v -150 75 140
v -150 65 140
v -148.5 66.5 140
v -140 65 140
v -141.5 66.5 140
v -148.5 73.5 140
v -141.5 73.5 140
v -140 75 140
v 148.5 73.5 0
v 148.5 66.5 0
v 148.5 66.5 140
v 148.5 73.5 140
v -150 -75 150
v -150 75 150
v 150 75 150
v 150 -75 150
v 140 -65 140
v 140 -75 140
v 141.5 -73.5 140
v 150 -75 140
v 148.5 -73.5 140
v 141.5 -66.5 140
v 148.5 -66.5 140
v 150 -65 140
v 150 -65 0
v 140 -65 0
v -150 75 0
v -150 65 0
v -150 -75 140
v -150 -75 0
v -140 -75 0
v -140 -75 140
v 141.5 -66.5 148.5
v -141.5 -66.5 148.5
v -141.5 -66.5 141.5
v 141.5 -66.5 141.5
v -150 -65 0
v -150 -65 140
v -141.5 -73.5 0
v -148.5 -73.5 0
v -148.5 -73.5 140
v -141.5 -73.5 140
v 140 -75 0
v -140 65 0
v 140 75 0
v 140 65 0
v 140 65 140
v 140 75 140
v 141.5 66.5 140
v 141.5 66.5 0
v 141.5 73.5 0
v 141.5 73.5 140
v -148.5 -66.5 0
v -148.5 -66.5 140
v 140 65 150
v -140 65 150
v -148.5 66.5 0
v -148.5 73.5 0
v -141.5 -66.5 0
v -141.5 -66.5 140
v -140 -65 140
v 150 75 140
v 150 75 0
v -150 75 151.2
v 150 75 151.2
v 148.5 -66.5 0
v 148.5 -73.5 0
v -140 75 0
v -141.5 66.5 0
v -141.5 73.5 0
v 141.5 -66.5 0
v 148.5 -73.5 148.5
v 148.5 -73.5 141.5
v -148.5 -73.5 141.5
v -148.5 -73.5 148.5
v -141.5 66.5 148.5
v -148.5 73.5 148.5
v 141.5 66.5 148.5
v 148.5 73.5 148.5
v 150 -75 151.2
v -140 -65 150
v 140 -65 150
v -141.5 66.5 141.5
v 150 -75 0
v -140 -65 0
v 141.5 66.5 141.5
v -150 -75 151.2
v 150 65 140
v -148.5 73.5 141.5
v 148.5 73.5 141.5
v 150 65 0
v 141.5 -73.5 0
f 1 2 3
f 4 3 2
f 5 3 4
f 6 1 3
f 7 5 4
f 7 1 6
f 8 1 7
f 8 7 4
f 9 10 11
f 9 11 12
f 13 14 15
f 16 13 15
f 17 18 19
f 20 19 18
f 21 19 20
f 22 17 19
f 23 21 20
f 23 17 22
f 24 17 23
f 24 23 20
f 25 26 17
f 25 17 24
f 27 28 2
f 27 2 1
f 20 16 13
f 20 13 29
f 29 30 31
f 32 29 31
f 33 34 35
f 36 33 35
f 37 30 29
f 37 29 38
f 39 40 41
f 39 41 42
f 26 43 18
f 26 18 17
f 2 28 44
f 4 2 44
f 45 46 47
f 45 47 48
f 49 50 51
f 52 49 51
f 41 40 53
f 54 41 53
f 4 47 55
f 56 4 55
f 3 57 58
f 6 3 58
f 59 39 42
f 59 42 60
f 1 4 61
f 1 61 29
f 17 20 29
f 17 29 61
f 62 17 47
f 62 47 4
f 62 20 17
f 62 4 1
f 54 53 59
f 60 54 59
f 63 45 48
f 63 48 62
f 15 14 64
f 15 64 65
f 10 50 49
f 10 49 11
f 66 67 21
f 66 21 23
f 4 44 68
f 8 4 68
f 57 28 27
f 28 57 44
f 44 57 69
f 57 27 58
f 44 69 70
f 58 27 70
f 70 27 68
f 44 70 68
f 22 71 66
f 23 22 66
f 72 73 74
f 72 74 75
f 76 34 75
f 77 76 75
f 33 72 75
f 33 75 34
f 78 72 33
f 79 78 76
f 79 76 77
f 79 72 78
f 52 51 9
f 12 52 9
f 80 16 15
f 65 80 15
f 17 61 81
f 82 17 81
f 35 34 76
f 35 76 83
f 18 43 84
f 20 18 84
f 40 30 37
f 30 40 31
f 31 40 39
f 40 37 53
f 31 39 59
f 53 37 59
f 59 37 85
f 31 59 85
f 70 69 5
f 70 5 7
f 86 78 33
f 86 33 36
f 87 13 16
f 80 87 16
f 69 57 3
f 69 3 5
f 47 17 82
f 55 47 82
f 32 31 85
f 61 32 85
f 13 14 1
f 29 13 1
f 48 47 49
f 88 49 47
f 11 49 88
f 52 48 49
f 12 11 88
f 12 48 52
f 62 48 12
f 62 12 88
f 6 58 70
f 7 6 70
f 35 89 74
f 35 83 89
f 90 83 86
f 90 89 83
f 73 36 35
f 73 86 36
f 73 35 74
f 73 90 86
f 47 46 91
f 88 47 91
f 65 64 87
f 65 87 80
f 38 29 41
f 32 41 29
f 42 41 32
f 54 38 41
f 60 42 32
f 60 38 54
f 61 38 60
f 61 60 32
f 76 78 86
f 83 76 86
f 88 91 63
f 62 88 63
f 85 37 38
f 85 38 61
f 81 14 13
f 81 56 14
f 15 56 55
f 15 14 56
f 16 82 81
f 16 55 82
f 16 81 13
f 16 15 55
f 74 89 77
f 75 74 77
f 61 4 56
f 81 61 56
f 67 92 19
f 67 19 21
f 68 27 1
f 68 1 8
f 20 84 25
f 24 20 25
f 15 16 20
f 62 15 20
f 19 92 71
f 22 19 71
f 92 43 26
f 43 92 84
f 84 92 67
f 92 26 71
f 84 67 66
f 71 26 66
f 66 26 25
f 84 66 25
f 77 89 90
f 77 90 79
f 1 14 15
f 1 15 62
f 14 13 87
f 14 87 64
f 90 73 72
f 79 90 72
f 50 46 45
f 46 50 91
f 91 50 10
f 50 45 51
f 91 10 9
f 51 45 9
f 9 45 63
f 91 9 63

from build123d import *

# Parameters (mm, degrees)
F0_W     = 10
F0_H     = 10
F0_W_2   = 7
F0_H_2   = 7
F1_DEPTH = 140
F3_W     = 10
F3_H     = 10
F3_W_2   = 7
F3_H_2   = 7
F5_W     = 300
F5_H     = 150
F6_DEPTH = 1.2


with BuildPart() as f1:
    # F0 (on Top) → F1 (new body)
    with BuildSketch(Plane.XY):
        with Locations((-145, 70)):
            Rectangle(F0_W, F0_H)
        with Locations((-145, 70)):
            Rectangle(F0_W_2, F0_H_2, mode=Mode.SUBTRACT)
    extrude(amount=F1_DEPTH)


with BuildPart() as f1b:
    # F0 (on Top) → F1, piece 2 (new body)
    with BuildSketch(Plane.XY):
        with Locations((145, 70)):
            Rectangle(F0_W, F0_H)
        with Locations((145, 70)):
            Rectangle(F0_W_2, F0_H_2, mode=Mode.SUBTRACT)
    extrude(amount=F1_DEPTH)


with BuildPart() as f1c:
    # F0 (on Top) → F1, piece 3 (new body)
    with BuildSketch(Plane.XY):
        with Locations((145, -70)):
            Rectangle(F0_W, F0_H)
        with Locations((145, -70)):
            Rectangle(F0_W_2, F0_H_2, mode=Mode.SUBTRACT)
    extrude(amount=F1_DEPTH)


with BuildPart() as f1d:
    # F0 (on Top) → F1, piece 4 (new body)
    with BuildSketch(Plane.XY):
        with Locations((-145, -70)):
            Rectangle(F0_W, F0_H)
        with Locations((-145, -70)):
            Rectangle(F0_W_2, F0_H_2, mode=Mode.SUBTRACT)
    extrude(amount=F1_DEPTH)


with BuildPart() as f4:
    # F4: sweep along a path in F2
    with BuildLine(Plane.XY.offset(140)) as f4_path:
        Line((-150, -75), (150, -75))
        Line((150, -75), (150, 75))
        Line((150, 75), (-150, 75))
        Line((-150, 75), (-150, -75))
    # F3 (on Right) → F4 (sweep)
    with BuildSketch(Plane.YZ):
        with Locations((-70, 145)):
            Rectangle(F3_W, F3_H)
        with Locations((-70, 145)):
            Rectangle(F3_W_2, F3_H_2, mode=Mode.SUBTRACT)
    sweep(path=f4_path.line, transition=Transition.RIGHT)


with BuildPart() as f6:
    # F5 (on face) → F6 (new body)
    with BuildSketch(Plane.XY.offset(150)):
        Rectangle(F5_W, F5_H)
    extrude(amount=F6_DEPTH)


solid = Compound([f1.part, f1b.part, f1c.part, f1d.part, f4.part, f6.part])
